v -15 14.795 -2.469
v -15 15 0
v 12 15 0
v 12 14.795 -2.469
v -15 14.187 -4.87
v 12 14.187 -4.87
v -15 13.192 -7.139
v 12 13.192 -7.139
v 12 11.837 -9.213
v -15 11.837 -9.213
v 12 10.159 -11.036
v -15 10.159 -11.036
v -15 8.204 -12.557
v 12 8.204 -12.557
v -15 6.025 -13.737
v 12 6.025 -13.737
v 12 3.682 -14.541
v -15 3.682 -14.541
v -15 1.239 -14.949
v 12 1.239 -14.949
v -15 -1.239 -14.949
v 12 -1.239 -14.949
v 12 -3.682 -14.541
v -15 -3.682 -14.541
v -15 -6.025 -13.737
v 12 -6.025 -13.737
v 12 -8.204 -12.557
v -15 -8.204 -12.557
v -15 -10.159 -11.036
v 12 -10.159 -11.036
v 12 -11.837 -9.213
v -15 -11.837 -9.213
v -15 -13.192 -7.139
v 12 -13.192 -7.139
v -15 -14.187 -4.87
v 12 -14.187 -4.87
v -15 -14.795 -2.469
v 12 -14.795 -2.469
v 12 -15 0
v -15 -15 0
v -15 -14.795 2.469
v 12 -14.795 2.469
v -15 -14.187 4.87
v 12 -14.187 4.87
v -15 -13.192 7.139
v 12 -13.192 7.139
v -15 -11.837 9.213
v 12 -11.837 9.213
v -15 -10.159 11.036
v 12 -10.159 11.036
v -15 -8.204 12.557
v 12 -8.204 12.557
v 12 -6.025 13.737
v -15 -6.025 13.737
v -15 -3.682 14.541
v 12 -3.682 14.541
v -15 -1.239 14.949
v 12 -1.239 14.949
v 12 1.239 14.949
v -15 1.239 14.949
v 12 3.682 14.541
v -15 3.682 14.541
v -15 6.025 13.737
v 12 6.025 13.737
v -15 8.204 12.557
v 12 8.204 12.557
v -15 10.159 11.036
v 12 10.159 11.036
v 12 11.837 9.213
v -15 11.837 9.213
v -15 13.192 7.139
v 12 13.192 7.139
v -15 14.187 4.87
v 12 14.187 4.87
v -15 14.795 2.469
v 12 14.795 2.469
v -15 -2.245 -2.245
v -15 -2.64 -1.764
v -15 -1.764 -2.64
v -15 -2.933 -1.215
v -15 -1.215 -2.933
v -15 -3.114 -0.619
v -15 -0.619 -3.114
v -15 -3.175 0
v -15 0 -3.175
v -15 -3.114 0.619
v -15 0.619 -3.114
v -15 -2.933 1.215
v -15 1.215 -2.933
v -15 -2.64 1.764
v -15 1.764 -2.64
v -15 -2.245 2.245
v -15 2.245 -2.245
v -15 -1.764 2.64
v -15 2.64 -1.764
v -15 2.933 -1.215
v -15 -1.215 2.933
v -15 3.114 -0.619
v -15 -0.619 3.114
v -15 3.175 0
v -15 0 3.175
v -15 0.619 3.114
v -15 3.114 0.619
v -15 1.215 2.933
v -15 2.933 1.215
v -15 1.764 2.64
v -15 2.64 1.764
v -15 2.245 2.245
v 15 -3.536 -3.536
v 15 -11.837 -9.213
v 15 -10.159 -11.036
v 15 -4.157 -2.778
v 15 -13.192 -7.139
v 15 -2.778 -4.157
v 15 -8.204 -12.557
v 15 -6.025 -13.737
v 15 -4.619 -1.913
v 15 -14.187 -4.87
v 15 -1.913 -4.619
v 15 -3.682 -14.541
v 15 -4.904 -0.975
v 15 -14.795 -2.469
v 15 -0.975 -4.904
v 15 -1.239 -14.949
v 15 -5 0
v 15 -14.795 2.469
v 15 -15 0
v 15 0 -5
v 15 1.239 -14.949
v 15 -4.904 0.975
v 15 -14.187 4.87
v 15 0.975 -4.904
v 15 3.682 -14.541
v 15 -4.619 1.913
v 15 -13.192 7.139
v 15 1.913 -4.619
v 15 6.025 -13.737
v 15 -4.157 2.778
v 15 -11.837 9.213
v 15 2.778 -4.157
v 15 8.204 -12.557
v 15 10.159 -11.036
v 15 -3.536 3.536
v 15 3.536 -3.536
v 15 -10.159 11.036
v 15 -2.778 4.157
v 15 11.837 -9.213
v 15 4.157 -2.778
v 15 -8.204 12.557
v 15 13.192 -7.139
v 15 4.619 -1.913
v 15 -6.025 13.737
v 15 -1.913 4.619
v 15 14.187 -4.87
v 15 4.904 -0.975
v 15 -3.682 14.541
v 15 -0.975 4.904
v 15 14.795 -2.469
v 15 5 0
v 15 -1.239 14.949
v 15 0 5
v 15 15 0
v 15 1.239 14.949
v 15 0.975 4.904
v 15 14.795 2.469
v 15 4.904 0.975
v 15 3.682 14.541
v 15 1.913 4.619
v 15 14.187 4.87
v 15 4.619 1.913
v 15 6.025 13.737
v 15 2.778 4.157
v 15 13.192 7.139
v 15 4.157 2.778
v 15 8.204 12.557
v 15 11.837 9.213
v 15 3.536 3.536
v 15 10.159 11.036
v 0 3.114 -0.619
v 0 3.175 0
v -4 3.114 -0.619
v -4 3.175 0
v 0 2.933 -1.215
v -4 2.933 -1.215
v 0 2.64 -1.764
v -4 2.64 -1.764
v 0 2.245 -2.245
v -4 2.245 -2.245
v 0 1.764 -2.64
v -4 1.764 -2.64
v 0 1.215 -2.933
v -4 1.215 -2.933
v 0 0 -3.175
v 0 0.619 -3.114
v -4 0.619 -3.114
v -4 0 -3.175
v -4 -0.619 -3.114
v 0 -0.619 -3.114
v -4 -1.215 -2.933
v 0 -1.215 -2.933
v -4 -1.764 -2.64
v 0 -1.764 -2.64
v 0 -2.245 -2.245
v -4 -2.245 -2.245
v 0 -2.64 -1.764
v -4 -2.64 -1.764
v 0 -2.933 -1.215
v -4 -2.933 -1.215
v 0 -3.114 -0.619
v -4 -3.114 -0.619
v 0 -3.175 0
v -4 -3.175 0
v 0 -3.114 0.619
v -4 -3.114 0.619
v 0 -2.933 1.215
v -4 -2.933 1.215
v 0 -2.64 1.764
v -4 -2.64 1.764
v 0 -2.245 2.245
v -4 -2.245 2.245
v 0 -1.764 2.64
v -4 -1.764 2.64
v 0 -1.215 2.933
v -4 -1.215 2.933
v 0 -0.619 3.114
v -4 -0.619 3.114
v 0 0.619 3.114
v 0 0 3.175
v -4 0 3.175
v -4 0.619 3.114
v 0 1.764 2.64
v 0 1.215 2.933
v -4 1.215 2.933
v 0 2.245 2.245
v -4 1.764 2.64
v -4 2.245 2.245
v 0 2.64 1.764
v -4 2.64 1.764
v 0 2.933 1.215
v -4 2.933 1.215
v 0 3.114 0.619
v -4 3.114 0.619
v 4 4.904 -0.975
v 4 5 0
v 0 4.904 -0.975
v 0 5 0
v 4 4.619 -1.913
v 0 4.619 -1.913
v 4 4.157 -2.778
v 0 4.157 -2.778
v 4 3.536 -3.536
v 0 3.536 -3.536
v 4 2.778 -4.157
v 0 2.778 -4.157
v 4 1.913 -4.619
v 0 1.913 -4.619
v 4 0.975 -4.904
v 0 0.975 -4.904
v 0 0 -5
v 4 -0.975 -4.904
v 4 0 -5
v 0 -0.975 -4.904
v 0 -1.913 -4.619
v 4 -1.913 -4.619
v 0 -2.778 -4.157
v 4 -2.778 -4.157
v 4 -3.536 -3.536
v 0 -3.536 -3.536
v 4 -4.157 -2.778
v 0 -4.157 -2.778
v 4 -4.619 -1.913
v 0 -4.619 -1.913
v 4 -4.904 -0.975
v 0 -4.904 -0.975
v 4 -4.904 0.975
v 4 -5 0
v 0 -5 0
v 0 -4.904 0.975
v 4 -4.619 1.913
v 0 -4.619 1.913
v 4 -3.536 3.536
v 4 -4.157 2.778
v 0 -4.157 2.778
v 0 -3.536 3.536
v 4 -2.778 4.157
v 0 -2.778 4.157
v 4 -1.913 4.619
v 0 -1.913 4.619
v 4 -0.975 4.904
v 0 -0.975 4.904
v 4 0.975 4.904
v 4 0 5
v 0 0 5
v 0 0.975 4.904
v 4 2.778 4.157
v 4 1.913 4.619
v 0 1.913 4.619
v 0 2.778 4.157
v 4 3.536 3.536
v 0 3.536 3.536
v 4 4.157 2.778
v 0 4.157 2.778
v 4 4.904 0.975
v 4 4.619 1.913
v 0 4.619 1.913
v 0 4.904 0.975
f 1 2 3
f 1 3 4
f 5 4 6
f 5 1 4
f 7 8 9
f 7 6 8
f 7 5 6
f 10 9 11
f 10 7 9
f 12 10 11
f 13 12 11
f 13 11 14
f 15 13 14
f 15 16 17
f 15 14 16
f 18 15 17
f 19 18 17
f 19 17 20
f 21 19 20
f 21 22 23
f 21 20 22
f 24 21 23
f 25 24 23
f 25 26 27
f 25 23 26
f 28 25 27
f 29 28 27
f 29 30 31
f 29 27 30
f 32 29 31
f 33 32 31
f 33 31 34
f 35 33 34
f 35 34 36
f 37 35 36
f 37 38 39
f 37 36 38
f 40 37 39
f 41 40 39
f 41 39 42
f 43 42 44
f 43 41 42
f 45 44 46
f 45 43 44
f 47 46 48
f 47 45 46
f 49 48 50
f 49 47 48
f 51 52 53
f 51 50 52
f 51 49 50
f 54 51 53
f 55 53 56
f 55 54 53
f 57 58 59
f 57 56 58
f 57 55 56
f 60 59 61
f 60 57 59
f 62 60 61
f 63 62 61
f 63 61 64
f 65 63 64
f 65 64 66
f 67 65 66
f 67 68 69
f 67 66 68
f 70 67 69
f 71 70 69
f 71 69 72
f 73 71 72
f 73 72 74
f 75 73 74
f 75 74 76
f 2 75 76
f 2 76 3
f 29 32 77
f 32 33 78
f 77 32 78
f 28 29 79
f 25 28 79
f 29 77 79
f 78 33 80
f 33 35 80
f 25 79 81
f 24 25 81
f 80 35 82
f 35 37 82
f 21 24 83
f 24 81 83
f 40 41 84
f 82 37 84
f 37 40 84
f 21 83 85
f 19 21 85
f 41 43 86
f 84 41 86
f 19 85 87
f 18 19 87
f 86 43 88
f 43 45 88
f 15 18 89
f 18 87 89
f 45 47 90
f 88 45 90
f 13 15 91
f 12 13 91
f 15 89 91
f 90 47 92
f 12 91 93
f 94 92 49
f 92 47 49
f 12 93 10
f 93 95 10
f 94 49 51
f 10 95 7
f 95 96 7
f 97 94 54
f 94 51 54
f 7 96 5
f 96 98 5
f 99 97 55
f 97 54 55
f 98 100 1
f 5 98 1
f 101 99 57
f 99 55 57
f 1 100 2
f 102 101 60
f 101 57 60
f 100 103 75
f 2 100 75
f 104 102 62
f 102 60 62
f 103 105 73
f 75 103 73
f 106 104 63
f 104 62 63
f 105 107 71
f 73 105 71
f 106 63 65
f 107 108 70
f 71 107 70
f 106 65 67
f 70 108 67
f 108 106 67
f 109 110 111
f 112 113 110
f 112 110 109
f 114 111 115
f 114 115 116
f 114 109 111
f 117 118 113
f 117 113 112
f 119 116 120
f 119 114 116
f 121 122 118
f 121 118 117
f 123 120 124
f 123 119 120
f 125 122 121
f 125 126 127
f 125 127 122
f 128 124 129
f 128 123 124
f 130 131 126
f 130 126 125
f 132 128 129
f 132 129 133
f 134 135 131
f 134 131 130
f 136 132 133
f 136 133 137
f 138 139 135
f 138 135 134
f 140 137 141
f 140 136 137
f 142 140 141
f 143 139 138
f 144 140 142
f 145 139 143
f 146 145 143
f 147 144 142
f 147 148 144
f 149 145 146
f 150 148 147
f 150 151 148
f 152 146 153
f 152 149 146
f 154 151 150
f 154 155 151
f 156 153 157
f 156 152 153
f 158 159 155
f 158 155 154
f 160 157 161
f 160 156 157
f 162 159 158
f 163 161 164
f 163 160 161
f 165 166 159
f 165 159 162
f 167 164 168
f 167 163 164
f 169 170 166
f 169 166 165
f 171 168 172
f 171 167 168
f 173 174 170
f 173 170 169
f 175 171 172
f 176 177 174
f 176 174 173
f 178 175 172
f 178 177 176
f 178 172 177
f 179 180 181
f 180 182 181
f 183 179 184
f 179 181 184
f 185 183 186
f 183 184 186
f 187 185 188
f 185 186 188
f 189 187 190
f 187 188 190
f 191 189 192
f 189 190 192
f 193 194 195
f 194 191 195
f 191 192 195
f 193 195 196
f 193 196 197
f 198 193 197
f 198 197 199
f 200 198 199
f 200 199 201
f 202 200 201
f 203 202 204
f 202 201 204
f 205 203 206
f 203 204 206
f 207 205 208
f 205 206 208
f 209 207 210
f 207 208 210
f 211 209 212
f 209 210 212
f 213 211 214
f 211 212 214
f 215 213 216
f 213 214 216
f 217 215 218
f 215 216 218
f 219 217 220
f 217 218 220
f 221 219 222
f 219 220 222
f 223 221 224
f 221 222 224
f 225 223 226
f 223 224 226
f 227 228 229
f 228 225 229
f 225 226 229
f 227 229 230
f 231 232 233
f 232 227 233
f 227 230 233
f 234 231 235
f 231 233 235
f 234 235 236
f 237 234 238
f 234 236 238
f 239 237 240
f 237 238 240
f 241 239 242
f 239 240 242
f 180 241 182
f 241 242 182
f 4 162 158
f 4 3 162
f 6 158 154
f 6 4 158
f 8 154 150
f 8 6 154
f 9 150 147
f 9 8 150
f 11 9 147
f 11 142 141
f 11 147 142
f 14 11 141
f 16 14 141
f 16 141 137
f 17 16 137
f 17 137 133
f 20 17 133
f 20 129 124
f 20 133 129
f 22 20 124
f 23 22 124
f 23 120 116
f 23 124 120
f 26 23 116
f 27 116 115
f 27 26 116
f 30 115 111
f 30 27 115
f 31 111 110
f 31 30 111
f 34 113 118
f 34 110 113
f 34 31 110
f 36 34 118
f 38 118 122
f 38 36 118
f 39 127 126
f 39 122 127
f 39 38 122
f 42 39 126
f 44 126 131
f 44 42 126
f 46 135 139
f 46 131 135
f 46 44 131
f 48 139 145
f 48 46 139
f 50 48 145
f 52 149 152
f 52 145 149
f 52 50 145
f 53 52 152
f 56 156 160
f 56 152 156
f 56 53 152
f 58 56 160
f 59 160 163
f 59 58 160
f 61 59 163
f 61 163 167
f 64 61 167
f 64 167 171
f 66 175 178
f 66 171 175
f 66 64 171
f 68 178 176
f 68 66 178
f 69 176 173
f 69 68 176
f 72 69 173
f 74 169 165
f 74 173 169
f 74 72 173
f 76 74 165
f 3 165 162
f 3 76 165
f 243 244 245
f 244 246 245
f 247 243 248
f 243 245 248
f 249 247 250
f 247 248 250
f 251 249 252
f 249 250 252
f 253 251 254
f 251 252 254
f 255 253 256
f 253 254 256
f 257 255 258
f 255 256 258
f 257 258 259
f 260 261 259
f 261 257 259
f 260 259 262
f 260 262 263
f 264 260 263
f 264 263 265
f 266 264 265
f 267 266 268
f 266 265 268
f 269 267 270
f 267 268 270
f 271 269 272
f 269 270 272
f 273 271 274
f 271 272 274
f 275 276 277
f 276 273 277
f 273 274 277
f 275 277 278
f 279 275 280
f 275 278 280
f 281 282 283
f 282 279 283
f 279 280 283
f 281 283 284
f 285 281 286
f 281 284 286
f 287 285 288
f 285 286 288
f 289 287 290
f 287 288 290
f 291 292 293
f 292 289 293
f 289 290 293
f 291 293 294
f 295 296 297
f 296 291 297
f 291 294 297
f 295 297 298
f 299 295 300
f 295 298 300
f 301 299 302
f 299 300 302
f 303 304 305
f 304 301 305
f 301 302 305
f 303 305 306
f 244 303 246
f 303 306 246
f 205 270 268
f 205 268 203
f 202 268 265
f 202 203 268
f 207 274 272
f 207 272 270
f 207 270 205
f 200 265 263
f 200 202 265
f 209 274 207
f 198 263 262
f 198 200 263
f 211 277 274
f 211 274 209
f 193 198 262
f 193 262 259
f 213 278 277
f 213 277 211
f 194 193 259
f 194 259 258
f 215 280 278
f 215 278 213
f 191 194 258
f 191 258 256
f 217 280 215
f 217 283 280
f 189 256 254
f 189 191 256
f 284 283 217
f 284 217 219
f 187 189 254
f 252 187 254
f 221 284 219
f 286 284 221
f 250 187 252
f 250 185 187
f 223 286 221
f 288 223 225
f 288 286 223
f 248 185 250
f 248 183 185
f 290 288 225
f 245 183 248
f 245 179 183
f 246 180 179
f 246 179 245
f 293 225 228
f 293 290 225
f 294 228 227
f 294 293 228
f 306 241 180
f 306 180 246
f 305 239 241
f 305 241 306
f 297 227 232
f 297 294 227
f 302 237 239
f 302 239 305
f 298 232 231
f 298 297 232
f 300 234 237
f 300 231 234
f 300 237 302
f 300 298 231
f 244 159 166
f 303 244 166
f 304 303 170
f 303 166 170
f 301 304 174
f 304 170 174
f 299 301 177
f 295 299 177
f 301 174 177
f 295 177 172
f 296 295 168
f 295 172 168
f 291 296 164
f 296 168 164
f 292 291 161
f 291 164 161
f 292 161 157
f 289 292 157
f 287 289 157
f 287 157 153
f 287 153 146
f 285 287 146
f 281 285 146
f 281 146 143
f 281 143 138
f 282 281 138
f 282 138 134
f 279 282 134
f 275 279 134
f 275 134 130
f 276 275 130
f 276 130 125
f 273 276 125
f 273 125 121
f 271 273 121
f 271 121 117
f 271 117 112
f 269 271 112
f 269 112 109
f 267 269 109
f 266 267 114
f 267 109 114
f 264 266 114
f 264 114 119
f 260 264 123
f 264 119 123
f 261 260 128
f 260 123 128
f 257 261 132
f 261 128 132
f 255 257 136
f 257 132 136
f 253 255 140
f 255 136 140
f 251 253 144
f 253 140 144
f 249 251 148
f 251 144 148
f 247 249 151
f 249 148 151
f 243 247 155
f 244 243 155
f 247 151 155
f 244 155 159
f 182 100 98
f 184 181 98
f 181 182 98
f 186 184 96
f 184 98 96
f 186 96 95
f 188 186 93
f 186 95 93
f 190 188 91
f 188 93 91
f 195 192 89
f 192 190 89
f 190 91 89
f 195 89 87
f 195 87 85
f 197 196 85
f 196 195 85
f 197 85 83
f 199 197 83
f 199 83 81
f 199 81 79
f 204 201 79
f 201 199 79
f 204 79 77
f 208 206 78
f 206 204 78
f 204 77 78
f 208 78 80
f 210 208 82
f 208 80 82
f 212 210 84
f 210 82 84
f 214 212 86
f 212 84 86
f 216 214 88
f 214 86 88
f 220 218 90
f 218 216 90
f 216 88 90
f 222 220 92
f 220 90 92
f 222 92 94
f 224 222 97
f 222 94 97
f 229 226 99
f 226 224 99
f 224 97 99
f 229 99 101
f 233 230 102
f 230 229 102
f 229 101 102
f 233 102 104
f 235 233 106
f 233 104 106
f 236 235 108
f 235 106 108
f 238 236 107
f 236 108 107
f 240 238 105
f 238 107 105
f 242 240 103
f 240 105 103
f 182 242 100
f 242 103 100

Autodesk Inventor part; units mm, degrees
ref_plane "YZ Plane" through (0, 0, 0) normal (1, 0, 0) x (0, 1, 0)
ref_plane "XZ Plane" through (0, 0, 0) normal (0, 1, 0) x (-1, 0, 0)
ref_plane "XY Plane" through (0, 0, 0) normal (0, 0, 1) x (1, 0, 0)
sketch "Эскиз3" plane through (0, 0, 0) normal (0, 0, 1) x (1, 0, 0)
  line L0 (-20.1552, 0) -> (30.6288, 0)
  line L1 (15, 15) -> (12, 15)
  line L2 (15, 5) -> (15, 15)
  line L3 (-4, 3.175) -> (-15, 3.175)
  line L4 (-15, 3.175) -> (-15, 15)
  line L5 (4, 5) -> (15, 5)
  line L6 (-30.312, 0) -> (40.7856, 0) projected
  line L7 (4, 5) -> (0, 5)
  line L8 (0, 5) -> (0, 3.175)
  line L9 (0, 3.175) -> (-4, 3.175)
  line L10 (12, 15) -> (-15, 15)
  dimension "d43" = 6.35
  dimension "d50" = 30
  dimension "d51" = 10
  dimension "d61" = 30
revolve "Вращение5" add sketch "Эскиз3" angle 360 about axis through (-20.1552, 0, 0) along (1, 0, 0)
properties part number "DR-30-6,35x10"
